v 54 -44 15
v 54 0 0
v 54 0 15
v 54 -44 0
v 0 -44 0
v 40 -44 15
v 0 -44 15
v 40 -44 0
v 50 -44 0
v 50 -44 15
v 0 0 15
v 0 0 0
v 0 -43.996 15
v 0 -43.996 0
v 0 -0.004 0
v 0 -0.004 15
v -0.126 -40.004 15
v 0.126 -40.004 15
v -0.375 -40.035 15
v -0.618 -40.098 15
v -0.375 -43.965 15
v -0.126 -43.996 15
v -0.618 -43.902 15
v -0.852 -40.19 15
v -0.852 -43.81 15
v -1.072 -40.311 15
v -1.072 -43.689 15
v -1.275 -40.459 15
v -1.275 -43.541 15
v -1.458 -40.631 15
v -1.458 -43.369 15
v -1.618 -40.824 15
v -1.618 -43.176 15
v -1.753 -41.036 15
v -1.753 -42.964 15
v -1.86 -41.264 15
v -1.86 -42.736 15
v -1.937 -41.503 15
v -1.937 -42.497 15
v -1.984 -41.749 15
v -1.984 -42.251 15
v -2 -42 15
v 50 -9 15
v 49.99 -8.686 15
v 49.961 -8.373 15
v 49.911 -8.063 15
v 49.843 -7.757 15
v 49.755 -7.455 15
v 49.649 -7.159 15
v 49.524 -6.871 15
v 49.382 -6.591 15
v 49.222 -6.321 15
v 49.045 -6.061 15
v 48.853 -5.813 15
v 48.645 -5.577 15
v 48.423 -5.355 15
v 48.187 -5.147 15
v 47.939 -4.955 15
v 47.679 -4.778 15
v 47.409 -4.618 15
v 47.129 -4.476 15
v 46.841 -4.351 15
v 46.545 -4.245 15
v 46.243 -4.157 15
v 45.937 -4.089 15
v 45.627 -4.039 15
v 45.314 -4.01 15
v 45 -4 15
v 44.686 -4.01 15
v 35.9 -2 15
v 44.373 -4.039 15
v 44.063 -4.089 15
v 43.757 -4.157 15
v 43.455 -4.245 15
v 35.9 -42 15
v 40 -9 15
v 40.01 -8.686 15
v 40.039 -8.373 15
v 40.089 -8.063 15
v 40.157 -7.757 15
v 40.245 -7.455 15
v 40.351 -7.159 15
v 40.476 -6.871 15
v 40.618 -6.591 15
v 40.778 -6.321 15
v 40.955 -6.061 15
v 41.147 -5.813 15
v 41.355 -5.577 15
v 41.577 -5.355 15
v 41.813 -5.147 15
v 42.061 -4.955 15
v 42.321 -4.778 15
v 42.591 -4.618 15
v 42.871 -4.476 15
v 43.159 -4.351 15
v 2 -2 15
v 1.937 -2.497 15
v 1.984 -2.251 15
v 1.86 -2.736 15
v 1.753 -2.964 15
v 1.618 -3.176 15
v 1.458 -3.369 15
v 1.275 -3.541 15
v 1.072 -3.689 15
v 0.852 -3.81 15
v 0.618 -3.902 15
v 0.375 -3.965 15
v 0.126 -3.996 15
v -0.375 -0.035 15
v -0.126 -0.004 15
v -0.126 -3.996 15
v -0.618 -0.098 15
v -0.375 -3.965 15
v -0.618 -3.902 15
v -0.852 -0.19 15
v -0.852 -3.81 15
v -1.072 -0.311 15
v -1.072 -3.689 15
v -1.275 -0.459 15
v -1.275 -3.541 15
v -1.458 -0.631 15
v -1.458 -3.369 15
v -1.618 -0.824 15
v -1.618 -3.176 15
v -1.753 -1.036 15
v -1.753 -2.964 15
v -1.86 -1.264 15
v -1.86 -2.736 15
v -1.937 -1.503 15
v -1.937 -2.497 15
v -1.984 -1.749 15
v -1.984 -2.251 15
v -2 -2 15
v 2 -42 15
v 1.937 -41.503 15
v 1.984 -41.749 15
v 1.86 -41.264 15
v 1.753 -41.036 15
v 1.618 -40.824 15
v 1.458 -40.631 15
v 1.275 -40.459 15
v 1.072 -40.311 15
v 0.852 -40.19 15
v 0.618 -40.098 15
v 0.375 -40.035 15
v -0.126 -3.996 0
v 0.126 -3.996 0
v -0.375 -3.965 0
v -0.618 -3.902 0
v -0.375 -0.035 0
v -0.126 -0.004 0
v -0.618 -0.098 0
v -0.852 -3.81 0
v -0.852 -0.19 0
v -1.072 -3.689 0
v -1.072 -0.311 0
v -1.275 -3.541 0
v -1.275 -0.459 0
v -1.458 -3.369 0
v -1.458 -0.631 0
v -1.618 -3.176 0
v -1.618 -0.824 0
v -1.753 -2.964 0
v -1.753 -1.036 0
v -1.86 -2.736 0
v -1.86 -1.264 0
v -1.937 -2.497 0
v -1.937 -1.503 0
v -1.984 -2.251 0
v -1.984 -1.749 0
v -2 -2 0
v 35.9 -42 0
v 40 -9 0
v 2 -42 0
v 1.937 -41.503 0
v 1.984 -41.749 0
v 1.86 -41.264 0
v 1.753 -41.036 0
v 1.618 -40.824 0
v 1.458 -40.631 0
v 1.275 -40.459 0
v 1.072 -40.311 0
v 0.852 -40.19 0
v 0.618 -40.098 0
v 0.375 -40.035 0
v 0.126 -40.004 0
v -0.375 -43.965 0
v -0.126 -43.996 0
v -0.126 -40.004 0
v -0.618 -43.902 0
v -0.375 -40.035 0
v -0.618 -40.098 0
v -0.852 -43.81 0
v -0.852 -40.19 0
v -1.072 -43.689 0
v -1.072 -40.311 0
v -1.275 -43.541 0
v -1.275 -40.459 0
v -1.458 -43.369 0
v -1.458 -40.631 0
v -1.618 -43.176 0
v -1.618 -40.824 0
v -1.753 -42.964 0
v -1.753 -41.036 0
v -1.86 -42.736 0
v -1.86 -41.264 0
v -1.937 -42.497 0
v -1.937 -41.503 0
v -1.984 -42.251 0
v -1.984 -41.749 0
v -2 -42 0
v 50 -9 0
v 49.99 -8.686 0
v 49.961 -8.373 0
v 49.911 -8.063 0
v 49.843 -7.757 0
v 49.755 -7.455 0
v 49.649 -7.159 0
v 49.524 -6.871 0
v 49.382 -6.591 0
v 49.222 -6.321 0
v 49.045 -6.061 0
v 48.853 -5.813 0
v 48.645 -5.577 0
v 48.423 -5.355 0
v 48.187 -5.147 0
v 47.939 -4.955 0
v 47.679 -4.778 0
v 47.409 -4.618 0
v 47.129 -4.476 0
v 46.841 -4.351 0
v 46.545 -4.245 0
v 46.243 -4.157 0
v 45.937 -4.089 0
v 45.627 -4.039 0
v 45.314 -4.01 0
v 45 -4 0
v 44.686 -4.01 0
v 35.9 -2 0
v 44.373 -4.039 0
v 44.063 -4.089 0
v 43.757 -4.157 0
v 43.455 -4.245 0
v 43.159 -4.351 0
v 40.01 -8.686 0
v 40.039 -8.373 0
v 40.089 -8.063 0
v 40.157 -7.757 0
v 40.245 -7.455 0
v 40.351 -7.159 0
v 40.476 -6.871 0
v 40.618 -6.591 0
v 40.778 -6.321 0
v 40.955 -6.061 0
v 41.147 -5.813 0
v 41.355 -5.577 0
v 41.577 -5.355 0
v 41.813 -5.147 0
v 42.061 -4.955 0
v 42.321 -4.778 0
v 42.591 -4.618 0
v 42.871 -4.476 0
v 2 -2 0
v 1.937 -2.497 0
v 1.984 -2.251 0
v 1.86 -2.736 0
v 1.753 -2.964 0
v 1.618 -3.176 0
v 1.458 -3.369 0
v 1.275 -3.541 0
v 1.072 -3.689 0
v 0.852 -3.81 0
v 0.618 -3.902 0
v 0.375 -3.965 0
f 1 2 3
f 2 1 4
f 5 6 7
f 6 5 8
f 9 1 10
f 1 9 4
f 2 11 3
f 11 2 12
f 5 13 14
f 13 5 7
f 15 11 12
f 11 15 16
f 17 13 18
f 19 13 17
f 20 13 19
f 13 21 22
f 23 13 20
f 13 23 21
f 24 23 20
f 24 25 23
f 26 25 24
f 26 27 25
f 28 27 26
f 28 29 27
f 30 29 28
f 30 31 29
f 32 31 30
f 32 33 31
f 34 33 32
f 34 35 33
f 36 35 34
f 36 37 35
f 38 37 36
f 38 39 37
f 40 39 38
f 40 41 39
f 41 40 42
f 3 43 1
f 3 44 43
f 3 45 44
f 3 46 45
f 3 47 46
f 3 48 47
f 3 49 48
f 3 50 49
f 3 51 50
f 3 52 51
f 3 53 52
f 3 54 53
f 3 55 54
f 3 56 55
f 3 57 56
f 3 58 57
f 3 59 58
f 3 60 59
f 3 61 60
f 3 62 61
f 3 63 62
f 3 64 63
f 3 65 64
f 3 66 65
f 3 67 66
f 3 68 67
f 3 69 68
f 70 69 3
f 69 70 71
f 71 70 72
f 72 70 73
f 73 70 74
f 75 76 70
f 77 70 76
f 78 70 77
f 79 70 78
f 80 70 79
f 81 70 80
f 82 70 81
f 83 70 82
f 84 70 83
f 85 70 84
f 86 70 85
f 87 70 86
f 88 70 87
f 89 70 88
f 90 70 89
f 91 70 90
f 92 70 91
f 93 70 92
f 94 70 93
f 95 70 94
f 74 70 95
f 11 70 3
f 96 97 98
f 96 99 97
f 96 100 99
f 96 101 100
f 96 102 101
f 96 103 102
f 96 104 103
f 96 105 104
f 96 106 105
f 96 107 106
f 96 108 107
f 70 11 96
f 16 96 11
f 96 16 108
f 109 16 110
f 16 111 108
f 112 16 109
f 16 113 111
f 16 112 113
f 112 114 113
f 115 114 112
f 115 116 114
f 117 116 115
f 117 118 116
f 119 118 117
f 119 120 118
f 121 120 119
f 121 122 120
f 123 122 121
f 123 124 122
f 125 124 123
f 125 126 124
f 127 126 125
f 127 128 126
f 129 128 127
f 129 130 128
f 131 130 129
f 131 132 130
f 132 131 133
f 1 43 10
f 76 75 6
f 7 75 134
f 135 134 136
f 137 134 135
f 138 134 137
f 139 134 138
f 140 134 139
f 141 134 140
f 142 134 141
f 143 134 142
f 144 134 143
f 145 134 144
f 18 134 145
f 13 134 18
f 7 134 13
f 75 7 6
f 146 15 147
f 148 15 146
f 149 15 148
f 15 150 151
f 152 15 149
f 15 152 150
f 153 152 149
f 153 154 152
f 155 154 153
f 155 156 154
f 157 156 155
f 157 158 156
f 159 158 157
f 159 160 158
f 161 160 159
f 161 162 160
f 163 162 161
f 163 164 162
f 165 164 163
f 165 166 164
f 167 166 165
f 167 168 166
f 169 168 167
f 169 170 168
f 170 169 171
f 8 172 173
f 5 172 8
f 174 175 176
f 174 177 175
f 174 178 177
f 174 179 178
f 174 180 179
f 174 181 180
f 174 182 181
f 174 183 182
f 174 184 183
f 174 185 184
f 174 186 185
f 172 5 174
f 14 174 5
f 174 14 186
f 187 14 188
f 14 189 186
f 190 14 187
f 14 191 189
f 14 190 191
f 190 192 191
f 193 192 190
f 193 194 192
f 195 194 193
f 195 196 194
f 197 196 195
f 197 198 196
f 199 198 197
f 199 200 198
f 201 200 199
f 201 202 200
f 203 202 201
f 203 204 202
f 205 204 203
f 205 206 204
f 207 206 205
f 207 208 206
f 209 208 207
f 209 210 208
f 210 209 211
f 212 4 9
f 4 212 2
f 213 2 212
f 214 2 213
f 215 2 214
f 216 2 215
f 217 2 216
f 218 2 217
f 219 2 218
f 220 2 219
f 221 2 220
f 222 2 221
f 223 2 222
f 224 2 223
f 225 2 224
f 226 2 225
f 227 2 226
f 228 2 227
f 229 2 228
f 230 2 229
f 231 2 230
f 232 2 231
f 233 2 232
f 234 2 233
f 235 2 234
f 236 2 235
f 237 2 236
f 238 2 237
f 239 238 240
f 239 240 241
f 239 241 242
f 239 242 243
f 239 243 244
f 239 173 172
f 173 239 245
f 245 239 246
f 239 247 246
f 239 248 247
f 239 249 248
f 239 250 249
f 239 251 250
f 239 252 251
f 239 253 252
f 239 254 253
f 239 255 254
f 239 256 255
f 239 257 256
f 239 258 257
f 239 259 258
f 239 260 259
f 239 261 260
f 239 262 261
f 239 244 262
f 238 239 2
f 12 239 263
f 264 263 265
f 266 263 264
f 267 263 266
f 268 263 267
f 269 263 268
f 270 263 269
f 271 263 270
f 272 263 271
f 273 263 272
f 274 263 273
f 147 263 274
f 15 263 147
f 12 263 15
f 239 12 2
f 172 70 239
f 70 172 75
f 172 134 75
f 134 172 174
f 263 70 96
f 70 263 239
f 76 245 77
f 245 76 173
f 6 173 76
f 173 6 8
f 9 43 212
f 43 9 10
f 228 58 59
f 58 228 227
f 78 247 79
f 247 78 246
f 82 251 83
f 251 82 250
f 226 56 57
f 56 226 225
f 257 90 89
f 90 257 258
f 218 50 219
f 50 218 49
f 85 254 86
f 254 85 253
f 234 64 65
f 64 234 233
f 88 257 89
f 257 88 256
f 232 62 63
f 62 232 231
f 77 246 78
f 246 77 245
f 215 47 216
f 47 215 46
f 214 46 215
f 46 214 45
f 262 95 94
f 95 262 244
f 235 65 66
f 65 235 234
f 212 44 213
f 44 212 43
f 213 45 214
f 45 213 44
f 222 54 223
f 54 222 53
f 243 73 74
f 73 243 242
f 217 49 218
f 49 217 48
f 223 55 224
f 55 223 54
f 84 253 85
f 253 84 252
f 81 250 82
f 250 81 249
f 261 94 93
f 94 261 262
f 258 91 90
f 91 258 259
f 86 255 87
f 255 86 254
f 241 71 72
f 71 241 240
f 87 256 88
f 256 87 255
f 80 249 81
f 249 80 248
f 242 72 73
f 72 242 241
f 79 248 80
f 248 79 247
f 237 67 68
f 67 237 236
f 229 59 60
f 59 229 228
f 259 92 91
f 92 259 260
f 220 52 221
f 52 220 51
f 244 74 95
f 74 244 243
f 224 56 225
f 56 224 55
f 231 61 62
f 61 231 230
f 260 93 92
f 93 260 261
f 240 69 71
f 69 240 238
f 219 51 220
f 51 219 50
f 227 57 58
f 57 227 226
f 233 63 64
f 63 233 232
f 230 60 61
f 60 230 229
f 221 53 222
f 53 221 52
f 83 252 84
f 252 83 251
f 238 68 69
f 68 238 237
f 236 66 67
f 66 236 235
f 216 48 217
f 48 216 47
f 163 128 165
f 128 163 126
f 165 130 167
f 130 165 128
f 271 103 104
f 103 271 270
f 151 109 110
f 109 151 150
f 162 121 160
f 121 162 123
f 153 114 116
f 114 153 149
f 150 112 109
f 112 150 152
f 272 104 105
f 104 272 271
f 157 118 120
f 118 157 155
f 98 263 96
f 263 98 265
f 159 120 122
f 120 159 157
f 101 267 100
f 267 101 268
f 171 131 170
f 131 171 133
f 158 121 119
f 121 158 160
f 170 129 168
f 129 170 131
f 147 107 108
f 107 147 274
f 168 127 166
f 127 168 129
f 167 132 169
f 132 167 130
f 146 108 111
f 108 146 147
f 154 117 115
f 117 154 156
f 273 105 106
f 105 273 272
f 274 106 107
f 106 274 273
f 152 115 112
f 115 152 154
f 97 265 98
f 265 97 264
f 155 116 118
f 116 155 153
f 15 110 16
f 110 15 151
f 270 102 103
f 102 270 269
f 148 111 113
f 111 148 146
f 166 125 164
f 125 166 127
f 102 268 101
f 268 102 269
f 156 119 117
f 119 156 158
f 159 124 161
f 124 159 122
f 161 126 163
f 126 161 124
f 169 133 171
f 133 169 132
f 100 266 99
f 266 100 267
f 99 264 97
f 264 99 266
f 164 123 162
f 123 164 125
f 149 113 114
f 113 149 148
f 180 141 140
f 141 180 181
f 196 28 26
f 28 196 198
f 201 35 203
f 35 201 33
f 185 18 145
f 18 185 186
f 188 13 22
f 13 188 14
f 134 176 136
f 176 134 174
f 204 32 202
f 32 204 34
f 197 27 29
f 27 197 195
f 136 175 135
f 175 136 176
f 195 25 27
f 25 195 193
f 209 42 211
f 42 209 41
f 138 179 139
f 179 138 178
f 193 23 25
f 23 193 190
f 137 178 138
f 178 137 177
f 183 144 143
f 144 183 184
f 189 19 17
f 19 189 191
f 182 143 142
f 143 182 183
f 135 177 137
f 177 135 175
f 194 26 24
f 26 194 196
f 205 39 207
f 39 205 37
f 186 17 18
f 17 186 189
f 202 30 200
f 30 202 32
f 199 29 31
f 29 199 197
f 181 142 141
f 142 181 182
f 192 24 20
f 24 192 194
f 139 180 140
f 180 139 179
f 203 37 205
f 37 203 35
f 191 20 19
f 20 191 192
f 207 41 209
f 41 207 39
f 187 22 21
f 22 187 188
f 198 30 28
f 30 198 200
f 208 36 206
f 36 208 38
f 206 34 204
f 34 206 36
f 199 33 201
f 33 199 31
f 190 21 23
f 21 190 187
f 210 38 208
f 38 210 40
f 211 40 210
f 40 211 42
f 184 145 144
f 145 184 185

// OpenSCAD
$desk_height = 40;
$width =  15;
$depth = 50;
$cable_diameter = 10;
$wall_thickness = 2;

rotate([90, 0, 0])
{

difference()
{
    cube([$depth + $wall_thickness * 2, $width, $desk_height + $wall_thickness * 2]);

    translate([-0.1, -$wall_thickness / 2, $wall_thickness])
    cube([$depth-$cable_diameter - $wall_thickness * 2, $width + $wall_thickness, $desk_height]);

    hull()
    {
        rotate([-90, 0, 0])
            translate([$depth - $cable_diameter / 2, -$cable_diameter / 2 - $wall_thickness * 2, -1])
                cylinder($width + $wall_thickness, $cable_diameter / 2, $cable_diameter / 2, $fn = 100);

        rotate([-90, 0, 0])
            translate([$depth - $cable_diameter / 2, -$desk_height - $wall_thickness * 2, -1])
                cylinder($width+2, $cable_diameter / 2, $cable_diameter / 2, $fn = 100);
    }
}

translate([0, 0, $wall_thickness])
    rotate([-90, 0, 0])
        cylinder($width, $wall_thickness, $wall_thickness, $fn = 50);

translate([0, 0, , $desk_height + $wall_thickness])
    rotate([-90, 0, 0])
        cylinder($width, $wall_thickness, $wall_thickness, $fn = 50);
}
